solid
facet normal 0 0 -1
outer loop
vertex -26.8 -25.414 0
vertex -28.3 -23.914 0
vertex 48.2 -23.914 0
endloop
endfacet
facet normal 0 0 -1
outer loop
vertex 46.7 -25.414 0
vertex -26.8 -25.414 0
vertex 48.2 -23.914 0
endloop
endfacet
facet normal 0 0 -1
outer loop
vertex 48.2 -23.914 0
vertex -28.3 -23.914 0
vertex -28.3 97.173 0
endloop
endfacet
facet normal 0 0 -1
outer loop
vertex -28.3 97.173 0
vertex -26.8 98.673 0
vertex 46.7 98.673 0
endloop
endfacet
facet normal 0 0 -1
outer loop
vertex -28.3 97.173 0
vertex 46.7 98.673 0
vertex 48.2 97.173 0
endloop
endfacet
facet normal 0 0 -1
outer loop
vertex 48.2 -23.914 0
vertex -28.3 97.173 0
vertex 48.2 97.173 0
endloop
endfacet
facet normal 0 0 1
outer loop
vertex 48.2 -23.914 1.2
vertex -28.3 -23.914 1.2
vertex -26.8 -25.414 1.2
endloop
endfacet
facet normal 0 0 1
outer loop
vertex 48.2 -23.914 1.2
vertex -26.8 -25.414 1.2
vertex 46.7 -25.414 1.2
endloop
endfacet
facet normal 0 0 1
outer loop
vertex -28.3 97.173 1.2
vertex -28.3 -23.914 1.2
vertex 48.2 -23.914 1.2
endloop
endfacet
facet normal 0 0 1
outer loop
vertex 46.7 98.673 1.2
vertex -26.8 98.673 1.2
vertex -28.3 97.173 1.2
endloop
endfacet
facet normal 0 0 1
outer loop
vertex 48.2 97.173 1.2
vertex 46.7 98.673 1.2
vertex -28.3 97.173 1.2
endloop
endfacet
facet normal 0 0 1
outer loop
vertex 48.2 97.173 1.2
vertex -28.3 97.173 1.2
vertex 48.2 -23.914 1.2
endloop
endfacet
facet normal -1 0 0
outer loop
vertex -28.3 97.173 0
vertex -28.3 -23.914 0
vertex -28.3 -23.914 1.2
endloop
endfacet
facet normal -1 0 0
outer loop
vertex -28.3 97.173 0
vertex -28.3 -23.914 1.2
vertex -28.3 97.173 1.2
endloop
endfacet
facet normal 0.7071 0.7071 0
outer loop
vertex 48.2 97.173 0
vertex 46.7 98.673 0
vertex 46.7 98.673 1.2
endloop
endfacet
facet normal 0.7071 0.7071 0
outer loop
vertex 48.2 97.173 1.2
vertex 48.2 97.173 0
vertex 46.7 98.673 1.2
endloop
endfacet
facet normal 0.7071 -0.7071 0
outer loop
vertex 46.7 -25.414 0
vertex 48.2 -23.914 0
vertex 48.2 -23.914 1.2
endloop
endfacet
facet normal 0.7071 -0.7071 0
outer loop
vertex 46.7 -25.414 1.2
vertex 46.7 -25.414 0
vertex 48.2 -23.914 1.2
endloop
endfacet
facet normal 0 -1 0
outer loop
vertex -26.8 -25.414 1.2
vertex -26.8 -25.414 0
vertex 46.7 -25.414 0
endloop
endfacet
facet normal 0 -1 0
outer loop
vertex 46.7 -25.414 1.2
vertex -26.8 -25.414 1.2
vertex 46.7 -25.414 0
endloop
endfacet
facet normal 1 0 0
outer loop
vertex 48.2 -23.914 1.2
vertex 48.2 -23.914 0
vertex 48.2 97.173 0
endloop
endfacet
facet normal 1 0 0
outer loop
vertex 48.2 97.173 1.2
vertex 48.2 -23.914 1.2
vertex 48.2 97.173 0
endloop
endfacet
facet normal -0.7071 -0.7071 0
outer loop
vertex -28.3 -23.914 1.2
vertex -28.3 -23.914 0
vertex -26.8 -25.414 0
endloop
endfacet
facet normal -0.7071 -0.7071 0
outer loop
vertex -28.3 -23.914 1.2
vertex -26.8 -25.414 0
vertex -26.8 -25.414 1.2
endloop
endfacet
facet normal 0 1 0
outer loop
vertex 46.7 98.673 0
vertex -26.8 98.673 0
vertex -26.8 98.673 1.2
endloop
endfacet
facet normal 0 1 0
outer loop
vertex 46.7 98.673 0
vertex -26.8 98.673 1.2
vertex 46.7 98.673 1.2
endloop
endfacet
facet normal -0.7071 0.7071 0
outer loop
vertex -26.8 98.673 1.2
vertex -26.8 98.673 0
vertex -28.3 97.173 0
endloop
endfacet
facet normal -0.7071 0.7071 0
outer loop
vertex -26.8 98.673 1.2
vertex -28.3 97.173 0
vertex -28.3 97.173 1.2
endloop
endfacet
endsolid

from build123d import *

# Parameters (mm, degrees)
SKETCH_1_W      = 76.5
SKETCH_1_H      = 124.087488664
EXTRUDE_1_DEPTH = 1.2
CHAMFER_1_SIZE  = 1.5


with BuildPart() as part:
    # 草图1 → 凸台-拉伸1 (new body)
    with BuildSketch(Plane.XY):
        with Locations((9.950404768, 36.629314437)):
            Rectangle(SKETCH_1_W, SKETCH_1_H)
    extrude(amount=EXTRUDE_1_DEPTH)

    # 倒角1
    chamfer_1_edges = [part.edges().sort_by_distance(p)[0] for p in [
        (48.200404768, -25.414429895, 0.6),
        (-28.299595232, -25.414429895, 0.6),
        (-28.299595232, 98.673058769, 0.6),
        (48.200404768, 98.673058769, 0.6),
    ]]
    chamfer(chamfer_1_edges, length=CHAMFER_1_SIZE)


solid = part.part
